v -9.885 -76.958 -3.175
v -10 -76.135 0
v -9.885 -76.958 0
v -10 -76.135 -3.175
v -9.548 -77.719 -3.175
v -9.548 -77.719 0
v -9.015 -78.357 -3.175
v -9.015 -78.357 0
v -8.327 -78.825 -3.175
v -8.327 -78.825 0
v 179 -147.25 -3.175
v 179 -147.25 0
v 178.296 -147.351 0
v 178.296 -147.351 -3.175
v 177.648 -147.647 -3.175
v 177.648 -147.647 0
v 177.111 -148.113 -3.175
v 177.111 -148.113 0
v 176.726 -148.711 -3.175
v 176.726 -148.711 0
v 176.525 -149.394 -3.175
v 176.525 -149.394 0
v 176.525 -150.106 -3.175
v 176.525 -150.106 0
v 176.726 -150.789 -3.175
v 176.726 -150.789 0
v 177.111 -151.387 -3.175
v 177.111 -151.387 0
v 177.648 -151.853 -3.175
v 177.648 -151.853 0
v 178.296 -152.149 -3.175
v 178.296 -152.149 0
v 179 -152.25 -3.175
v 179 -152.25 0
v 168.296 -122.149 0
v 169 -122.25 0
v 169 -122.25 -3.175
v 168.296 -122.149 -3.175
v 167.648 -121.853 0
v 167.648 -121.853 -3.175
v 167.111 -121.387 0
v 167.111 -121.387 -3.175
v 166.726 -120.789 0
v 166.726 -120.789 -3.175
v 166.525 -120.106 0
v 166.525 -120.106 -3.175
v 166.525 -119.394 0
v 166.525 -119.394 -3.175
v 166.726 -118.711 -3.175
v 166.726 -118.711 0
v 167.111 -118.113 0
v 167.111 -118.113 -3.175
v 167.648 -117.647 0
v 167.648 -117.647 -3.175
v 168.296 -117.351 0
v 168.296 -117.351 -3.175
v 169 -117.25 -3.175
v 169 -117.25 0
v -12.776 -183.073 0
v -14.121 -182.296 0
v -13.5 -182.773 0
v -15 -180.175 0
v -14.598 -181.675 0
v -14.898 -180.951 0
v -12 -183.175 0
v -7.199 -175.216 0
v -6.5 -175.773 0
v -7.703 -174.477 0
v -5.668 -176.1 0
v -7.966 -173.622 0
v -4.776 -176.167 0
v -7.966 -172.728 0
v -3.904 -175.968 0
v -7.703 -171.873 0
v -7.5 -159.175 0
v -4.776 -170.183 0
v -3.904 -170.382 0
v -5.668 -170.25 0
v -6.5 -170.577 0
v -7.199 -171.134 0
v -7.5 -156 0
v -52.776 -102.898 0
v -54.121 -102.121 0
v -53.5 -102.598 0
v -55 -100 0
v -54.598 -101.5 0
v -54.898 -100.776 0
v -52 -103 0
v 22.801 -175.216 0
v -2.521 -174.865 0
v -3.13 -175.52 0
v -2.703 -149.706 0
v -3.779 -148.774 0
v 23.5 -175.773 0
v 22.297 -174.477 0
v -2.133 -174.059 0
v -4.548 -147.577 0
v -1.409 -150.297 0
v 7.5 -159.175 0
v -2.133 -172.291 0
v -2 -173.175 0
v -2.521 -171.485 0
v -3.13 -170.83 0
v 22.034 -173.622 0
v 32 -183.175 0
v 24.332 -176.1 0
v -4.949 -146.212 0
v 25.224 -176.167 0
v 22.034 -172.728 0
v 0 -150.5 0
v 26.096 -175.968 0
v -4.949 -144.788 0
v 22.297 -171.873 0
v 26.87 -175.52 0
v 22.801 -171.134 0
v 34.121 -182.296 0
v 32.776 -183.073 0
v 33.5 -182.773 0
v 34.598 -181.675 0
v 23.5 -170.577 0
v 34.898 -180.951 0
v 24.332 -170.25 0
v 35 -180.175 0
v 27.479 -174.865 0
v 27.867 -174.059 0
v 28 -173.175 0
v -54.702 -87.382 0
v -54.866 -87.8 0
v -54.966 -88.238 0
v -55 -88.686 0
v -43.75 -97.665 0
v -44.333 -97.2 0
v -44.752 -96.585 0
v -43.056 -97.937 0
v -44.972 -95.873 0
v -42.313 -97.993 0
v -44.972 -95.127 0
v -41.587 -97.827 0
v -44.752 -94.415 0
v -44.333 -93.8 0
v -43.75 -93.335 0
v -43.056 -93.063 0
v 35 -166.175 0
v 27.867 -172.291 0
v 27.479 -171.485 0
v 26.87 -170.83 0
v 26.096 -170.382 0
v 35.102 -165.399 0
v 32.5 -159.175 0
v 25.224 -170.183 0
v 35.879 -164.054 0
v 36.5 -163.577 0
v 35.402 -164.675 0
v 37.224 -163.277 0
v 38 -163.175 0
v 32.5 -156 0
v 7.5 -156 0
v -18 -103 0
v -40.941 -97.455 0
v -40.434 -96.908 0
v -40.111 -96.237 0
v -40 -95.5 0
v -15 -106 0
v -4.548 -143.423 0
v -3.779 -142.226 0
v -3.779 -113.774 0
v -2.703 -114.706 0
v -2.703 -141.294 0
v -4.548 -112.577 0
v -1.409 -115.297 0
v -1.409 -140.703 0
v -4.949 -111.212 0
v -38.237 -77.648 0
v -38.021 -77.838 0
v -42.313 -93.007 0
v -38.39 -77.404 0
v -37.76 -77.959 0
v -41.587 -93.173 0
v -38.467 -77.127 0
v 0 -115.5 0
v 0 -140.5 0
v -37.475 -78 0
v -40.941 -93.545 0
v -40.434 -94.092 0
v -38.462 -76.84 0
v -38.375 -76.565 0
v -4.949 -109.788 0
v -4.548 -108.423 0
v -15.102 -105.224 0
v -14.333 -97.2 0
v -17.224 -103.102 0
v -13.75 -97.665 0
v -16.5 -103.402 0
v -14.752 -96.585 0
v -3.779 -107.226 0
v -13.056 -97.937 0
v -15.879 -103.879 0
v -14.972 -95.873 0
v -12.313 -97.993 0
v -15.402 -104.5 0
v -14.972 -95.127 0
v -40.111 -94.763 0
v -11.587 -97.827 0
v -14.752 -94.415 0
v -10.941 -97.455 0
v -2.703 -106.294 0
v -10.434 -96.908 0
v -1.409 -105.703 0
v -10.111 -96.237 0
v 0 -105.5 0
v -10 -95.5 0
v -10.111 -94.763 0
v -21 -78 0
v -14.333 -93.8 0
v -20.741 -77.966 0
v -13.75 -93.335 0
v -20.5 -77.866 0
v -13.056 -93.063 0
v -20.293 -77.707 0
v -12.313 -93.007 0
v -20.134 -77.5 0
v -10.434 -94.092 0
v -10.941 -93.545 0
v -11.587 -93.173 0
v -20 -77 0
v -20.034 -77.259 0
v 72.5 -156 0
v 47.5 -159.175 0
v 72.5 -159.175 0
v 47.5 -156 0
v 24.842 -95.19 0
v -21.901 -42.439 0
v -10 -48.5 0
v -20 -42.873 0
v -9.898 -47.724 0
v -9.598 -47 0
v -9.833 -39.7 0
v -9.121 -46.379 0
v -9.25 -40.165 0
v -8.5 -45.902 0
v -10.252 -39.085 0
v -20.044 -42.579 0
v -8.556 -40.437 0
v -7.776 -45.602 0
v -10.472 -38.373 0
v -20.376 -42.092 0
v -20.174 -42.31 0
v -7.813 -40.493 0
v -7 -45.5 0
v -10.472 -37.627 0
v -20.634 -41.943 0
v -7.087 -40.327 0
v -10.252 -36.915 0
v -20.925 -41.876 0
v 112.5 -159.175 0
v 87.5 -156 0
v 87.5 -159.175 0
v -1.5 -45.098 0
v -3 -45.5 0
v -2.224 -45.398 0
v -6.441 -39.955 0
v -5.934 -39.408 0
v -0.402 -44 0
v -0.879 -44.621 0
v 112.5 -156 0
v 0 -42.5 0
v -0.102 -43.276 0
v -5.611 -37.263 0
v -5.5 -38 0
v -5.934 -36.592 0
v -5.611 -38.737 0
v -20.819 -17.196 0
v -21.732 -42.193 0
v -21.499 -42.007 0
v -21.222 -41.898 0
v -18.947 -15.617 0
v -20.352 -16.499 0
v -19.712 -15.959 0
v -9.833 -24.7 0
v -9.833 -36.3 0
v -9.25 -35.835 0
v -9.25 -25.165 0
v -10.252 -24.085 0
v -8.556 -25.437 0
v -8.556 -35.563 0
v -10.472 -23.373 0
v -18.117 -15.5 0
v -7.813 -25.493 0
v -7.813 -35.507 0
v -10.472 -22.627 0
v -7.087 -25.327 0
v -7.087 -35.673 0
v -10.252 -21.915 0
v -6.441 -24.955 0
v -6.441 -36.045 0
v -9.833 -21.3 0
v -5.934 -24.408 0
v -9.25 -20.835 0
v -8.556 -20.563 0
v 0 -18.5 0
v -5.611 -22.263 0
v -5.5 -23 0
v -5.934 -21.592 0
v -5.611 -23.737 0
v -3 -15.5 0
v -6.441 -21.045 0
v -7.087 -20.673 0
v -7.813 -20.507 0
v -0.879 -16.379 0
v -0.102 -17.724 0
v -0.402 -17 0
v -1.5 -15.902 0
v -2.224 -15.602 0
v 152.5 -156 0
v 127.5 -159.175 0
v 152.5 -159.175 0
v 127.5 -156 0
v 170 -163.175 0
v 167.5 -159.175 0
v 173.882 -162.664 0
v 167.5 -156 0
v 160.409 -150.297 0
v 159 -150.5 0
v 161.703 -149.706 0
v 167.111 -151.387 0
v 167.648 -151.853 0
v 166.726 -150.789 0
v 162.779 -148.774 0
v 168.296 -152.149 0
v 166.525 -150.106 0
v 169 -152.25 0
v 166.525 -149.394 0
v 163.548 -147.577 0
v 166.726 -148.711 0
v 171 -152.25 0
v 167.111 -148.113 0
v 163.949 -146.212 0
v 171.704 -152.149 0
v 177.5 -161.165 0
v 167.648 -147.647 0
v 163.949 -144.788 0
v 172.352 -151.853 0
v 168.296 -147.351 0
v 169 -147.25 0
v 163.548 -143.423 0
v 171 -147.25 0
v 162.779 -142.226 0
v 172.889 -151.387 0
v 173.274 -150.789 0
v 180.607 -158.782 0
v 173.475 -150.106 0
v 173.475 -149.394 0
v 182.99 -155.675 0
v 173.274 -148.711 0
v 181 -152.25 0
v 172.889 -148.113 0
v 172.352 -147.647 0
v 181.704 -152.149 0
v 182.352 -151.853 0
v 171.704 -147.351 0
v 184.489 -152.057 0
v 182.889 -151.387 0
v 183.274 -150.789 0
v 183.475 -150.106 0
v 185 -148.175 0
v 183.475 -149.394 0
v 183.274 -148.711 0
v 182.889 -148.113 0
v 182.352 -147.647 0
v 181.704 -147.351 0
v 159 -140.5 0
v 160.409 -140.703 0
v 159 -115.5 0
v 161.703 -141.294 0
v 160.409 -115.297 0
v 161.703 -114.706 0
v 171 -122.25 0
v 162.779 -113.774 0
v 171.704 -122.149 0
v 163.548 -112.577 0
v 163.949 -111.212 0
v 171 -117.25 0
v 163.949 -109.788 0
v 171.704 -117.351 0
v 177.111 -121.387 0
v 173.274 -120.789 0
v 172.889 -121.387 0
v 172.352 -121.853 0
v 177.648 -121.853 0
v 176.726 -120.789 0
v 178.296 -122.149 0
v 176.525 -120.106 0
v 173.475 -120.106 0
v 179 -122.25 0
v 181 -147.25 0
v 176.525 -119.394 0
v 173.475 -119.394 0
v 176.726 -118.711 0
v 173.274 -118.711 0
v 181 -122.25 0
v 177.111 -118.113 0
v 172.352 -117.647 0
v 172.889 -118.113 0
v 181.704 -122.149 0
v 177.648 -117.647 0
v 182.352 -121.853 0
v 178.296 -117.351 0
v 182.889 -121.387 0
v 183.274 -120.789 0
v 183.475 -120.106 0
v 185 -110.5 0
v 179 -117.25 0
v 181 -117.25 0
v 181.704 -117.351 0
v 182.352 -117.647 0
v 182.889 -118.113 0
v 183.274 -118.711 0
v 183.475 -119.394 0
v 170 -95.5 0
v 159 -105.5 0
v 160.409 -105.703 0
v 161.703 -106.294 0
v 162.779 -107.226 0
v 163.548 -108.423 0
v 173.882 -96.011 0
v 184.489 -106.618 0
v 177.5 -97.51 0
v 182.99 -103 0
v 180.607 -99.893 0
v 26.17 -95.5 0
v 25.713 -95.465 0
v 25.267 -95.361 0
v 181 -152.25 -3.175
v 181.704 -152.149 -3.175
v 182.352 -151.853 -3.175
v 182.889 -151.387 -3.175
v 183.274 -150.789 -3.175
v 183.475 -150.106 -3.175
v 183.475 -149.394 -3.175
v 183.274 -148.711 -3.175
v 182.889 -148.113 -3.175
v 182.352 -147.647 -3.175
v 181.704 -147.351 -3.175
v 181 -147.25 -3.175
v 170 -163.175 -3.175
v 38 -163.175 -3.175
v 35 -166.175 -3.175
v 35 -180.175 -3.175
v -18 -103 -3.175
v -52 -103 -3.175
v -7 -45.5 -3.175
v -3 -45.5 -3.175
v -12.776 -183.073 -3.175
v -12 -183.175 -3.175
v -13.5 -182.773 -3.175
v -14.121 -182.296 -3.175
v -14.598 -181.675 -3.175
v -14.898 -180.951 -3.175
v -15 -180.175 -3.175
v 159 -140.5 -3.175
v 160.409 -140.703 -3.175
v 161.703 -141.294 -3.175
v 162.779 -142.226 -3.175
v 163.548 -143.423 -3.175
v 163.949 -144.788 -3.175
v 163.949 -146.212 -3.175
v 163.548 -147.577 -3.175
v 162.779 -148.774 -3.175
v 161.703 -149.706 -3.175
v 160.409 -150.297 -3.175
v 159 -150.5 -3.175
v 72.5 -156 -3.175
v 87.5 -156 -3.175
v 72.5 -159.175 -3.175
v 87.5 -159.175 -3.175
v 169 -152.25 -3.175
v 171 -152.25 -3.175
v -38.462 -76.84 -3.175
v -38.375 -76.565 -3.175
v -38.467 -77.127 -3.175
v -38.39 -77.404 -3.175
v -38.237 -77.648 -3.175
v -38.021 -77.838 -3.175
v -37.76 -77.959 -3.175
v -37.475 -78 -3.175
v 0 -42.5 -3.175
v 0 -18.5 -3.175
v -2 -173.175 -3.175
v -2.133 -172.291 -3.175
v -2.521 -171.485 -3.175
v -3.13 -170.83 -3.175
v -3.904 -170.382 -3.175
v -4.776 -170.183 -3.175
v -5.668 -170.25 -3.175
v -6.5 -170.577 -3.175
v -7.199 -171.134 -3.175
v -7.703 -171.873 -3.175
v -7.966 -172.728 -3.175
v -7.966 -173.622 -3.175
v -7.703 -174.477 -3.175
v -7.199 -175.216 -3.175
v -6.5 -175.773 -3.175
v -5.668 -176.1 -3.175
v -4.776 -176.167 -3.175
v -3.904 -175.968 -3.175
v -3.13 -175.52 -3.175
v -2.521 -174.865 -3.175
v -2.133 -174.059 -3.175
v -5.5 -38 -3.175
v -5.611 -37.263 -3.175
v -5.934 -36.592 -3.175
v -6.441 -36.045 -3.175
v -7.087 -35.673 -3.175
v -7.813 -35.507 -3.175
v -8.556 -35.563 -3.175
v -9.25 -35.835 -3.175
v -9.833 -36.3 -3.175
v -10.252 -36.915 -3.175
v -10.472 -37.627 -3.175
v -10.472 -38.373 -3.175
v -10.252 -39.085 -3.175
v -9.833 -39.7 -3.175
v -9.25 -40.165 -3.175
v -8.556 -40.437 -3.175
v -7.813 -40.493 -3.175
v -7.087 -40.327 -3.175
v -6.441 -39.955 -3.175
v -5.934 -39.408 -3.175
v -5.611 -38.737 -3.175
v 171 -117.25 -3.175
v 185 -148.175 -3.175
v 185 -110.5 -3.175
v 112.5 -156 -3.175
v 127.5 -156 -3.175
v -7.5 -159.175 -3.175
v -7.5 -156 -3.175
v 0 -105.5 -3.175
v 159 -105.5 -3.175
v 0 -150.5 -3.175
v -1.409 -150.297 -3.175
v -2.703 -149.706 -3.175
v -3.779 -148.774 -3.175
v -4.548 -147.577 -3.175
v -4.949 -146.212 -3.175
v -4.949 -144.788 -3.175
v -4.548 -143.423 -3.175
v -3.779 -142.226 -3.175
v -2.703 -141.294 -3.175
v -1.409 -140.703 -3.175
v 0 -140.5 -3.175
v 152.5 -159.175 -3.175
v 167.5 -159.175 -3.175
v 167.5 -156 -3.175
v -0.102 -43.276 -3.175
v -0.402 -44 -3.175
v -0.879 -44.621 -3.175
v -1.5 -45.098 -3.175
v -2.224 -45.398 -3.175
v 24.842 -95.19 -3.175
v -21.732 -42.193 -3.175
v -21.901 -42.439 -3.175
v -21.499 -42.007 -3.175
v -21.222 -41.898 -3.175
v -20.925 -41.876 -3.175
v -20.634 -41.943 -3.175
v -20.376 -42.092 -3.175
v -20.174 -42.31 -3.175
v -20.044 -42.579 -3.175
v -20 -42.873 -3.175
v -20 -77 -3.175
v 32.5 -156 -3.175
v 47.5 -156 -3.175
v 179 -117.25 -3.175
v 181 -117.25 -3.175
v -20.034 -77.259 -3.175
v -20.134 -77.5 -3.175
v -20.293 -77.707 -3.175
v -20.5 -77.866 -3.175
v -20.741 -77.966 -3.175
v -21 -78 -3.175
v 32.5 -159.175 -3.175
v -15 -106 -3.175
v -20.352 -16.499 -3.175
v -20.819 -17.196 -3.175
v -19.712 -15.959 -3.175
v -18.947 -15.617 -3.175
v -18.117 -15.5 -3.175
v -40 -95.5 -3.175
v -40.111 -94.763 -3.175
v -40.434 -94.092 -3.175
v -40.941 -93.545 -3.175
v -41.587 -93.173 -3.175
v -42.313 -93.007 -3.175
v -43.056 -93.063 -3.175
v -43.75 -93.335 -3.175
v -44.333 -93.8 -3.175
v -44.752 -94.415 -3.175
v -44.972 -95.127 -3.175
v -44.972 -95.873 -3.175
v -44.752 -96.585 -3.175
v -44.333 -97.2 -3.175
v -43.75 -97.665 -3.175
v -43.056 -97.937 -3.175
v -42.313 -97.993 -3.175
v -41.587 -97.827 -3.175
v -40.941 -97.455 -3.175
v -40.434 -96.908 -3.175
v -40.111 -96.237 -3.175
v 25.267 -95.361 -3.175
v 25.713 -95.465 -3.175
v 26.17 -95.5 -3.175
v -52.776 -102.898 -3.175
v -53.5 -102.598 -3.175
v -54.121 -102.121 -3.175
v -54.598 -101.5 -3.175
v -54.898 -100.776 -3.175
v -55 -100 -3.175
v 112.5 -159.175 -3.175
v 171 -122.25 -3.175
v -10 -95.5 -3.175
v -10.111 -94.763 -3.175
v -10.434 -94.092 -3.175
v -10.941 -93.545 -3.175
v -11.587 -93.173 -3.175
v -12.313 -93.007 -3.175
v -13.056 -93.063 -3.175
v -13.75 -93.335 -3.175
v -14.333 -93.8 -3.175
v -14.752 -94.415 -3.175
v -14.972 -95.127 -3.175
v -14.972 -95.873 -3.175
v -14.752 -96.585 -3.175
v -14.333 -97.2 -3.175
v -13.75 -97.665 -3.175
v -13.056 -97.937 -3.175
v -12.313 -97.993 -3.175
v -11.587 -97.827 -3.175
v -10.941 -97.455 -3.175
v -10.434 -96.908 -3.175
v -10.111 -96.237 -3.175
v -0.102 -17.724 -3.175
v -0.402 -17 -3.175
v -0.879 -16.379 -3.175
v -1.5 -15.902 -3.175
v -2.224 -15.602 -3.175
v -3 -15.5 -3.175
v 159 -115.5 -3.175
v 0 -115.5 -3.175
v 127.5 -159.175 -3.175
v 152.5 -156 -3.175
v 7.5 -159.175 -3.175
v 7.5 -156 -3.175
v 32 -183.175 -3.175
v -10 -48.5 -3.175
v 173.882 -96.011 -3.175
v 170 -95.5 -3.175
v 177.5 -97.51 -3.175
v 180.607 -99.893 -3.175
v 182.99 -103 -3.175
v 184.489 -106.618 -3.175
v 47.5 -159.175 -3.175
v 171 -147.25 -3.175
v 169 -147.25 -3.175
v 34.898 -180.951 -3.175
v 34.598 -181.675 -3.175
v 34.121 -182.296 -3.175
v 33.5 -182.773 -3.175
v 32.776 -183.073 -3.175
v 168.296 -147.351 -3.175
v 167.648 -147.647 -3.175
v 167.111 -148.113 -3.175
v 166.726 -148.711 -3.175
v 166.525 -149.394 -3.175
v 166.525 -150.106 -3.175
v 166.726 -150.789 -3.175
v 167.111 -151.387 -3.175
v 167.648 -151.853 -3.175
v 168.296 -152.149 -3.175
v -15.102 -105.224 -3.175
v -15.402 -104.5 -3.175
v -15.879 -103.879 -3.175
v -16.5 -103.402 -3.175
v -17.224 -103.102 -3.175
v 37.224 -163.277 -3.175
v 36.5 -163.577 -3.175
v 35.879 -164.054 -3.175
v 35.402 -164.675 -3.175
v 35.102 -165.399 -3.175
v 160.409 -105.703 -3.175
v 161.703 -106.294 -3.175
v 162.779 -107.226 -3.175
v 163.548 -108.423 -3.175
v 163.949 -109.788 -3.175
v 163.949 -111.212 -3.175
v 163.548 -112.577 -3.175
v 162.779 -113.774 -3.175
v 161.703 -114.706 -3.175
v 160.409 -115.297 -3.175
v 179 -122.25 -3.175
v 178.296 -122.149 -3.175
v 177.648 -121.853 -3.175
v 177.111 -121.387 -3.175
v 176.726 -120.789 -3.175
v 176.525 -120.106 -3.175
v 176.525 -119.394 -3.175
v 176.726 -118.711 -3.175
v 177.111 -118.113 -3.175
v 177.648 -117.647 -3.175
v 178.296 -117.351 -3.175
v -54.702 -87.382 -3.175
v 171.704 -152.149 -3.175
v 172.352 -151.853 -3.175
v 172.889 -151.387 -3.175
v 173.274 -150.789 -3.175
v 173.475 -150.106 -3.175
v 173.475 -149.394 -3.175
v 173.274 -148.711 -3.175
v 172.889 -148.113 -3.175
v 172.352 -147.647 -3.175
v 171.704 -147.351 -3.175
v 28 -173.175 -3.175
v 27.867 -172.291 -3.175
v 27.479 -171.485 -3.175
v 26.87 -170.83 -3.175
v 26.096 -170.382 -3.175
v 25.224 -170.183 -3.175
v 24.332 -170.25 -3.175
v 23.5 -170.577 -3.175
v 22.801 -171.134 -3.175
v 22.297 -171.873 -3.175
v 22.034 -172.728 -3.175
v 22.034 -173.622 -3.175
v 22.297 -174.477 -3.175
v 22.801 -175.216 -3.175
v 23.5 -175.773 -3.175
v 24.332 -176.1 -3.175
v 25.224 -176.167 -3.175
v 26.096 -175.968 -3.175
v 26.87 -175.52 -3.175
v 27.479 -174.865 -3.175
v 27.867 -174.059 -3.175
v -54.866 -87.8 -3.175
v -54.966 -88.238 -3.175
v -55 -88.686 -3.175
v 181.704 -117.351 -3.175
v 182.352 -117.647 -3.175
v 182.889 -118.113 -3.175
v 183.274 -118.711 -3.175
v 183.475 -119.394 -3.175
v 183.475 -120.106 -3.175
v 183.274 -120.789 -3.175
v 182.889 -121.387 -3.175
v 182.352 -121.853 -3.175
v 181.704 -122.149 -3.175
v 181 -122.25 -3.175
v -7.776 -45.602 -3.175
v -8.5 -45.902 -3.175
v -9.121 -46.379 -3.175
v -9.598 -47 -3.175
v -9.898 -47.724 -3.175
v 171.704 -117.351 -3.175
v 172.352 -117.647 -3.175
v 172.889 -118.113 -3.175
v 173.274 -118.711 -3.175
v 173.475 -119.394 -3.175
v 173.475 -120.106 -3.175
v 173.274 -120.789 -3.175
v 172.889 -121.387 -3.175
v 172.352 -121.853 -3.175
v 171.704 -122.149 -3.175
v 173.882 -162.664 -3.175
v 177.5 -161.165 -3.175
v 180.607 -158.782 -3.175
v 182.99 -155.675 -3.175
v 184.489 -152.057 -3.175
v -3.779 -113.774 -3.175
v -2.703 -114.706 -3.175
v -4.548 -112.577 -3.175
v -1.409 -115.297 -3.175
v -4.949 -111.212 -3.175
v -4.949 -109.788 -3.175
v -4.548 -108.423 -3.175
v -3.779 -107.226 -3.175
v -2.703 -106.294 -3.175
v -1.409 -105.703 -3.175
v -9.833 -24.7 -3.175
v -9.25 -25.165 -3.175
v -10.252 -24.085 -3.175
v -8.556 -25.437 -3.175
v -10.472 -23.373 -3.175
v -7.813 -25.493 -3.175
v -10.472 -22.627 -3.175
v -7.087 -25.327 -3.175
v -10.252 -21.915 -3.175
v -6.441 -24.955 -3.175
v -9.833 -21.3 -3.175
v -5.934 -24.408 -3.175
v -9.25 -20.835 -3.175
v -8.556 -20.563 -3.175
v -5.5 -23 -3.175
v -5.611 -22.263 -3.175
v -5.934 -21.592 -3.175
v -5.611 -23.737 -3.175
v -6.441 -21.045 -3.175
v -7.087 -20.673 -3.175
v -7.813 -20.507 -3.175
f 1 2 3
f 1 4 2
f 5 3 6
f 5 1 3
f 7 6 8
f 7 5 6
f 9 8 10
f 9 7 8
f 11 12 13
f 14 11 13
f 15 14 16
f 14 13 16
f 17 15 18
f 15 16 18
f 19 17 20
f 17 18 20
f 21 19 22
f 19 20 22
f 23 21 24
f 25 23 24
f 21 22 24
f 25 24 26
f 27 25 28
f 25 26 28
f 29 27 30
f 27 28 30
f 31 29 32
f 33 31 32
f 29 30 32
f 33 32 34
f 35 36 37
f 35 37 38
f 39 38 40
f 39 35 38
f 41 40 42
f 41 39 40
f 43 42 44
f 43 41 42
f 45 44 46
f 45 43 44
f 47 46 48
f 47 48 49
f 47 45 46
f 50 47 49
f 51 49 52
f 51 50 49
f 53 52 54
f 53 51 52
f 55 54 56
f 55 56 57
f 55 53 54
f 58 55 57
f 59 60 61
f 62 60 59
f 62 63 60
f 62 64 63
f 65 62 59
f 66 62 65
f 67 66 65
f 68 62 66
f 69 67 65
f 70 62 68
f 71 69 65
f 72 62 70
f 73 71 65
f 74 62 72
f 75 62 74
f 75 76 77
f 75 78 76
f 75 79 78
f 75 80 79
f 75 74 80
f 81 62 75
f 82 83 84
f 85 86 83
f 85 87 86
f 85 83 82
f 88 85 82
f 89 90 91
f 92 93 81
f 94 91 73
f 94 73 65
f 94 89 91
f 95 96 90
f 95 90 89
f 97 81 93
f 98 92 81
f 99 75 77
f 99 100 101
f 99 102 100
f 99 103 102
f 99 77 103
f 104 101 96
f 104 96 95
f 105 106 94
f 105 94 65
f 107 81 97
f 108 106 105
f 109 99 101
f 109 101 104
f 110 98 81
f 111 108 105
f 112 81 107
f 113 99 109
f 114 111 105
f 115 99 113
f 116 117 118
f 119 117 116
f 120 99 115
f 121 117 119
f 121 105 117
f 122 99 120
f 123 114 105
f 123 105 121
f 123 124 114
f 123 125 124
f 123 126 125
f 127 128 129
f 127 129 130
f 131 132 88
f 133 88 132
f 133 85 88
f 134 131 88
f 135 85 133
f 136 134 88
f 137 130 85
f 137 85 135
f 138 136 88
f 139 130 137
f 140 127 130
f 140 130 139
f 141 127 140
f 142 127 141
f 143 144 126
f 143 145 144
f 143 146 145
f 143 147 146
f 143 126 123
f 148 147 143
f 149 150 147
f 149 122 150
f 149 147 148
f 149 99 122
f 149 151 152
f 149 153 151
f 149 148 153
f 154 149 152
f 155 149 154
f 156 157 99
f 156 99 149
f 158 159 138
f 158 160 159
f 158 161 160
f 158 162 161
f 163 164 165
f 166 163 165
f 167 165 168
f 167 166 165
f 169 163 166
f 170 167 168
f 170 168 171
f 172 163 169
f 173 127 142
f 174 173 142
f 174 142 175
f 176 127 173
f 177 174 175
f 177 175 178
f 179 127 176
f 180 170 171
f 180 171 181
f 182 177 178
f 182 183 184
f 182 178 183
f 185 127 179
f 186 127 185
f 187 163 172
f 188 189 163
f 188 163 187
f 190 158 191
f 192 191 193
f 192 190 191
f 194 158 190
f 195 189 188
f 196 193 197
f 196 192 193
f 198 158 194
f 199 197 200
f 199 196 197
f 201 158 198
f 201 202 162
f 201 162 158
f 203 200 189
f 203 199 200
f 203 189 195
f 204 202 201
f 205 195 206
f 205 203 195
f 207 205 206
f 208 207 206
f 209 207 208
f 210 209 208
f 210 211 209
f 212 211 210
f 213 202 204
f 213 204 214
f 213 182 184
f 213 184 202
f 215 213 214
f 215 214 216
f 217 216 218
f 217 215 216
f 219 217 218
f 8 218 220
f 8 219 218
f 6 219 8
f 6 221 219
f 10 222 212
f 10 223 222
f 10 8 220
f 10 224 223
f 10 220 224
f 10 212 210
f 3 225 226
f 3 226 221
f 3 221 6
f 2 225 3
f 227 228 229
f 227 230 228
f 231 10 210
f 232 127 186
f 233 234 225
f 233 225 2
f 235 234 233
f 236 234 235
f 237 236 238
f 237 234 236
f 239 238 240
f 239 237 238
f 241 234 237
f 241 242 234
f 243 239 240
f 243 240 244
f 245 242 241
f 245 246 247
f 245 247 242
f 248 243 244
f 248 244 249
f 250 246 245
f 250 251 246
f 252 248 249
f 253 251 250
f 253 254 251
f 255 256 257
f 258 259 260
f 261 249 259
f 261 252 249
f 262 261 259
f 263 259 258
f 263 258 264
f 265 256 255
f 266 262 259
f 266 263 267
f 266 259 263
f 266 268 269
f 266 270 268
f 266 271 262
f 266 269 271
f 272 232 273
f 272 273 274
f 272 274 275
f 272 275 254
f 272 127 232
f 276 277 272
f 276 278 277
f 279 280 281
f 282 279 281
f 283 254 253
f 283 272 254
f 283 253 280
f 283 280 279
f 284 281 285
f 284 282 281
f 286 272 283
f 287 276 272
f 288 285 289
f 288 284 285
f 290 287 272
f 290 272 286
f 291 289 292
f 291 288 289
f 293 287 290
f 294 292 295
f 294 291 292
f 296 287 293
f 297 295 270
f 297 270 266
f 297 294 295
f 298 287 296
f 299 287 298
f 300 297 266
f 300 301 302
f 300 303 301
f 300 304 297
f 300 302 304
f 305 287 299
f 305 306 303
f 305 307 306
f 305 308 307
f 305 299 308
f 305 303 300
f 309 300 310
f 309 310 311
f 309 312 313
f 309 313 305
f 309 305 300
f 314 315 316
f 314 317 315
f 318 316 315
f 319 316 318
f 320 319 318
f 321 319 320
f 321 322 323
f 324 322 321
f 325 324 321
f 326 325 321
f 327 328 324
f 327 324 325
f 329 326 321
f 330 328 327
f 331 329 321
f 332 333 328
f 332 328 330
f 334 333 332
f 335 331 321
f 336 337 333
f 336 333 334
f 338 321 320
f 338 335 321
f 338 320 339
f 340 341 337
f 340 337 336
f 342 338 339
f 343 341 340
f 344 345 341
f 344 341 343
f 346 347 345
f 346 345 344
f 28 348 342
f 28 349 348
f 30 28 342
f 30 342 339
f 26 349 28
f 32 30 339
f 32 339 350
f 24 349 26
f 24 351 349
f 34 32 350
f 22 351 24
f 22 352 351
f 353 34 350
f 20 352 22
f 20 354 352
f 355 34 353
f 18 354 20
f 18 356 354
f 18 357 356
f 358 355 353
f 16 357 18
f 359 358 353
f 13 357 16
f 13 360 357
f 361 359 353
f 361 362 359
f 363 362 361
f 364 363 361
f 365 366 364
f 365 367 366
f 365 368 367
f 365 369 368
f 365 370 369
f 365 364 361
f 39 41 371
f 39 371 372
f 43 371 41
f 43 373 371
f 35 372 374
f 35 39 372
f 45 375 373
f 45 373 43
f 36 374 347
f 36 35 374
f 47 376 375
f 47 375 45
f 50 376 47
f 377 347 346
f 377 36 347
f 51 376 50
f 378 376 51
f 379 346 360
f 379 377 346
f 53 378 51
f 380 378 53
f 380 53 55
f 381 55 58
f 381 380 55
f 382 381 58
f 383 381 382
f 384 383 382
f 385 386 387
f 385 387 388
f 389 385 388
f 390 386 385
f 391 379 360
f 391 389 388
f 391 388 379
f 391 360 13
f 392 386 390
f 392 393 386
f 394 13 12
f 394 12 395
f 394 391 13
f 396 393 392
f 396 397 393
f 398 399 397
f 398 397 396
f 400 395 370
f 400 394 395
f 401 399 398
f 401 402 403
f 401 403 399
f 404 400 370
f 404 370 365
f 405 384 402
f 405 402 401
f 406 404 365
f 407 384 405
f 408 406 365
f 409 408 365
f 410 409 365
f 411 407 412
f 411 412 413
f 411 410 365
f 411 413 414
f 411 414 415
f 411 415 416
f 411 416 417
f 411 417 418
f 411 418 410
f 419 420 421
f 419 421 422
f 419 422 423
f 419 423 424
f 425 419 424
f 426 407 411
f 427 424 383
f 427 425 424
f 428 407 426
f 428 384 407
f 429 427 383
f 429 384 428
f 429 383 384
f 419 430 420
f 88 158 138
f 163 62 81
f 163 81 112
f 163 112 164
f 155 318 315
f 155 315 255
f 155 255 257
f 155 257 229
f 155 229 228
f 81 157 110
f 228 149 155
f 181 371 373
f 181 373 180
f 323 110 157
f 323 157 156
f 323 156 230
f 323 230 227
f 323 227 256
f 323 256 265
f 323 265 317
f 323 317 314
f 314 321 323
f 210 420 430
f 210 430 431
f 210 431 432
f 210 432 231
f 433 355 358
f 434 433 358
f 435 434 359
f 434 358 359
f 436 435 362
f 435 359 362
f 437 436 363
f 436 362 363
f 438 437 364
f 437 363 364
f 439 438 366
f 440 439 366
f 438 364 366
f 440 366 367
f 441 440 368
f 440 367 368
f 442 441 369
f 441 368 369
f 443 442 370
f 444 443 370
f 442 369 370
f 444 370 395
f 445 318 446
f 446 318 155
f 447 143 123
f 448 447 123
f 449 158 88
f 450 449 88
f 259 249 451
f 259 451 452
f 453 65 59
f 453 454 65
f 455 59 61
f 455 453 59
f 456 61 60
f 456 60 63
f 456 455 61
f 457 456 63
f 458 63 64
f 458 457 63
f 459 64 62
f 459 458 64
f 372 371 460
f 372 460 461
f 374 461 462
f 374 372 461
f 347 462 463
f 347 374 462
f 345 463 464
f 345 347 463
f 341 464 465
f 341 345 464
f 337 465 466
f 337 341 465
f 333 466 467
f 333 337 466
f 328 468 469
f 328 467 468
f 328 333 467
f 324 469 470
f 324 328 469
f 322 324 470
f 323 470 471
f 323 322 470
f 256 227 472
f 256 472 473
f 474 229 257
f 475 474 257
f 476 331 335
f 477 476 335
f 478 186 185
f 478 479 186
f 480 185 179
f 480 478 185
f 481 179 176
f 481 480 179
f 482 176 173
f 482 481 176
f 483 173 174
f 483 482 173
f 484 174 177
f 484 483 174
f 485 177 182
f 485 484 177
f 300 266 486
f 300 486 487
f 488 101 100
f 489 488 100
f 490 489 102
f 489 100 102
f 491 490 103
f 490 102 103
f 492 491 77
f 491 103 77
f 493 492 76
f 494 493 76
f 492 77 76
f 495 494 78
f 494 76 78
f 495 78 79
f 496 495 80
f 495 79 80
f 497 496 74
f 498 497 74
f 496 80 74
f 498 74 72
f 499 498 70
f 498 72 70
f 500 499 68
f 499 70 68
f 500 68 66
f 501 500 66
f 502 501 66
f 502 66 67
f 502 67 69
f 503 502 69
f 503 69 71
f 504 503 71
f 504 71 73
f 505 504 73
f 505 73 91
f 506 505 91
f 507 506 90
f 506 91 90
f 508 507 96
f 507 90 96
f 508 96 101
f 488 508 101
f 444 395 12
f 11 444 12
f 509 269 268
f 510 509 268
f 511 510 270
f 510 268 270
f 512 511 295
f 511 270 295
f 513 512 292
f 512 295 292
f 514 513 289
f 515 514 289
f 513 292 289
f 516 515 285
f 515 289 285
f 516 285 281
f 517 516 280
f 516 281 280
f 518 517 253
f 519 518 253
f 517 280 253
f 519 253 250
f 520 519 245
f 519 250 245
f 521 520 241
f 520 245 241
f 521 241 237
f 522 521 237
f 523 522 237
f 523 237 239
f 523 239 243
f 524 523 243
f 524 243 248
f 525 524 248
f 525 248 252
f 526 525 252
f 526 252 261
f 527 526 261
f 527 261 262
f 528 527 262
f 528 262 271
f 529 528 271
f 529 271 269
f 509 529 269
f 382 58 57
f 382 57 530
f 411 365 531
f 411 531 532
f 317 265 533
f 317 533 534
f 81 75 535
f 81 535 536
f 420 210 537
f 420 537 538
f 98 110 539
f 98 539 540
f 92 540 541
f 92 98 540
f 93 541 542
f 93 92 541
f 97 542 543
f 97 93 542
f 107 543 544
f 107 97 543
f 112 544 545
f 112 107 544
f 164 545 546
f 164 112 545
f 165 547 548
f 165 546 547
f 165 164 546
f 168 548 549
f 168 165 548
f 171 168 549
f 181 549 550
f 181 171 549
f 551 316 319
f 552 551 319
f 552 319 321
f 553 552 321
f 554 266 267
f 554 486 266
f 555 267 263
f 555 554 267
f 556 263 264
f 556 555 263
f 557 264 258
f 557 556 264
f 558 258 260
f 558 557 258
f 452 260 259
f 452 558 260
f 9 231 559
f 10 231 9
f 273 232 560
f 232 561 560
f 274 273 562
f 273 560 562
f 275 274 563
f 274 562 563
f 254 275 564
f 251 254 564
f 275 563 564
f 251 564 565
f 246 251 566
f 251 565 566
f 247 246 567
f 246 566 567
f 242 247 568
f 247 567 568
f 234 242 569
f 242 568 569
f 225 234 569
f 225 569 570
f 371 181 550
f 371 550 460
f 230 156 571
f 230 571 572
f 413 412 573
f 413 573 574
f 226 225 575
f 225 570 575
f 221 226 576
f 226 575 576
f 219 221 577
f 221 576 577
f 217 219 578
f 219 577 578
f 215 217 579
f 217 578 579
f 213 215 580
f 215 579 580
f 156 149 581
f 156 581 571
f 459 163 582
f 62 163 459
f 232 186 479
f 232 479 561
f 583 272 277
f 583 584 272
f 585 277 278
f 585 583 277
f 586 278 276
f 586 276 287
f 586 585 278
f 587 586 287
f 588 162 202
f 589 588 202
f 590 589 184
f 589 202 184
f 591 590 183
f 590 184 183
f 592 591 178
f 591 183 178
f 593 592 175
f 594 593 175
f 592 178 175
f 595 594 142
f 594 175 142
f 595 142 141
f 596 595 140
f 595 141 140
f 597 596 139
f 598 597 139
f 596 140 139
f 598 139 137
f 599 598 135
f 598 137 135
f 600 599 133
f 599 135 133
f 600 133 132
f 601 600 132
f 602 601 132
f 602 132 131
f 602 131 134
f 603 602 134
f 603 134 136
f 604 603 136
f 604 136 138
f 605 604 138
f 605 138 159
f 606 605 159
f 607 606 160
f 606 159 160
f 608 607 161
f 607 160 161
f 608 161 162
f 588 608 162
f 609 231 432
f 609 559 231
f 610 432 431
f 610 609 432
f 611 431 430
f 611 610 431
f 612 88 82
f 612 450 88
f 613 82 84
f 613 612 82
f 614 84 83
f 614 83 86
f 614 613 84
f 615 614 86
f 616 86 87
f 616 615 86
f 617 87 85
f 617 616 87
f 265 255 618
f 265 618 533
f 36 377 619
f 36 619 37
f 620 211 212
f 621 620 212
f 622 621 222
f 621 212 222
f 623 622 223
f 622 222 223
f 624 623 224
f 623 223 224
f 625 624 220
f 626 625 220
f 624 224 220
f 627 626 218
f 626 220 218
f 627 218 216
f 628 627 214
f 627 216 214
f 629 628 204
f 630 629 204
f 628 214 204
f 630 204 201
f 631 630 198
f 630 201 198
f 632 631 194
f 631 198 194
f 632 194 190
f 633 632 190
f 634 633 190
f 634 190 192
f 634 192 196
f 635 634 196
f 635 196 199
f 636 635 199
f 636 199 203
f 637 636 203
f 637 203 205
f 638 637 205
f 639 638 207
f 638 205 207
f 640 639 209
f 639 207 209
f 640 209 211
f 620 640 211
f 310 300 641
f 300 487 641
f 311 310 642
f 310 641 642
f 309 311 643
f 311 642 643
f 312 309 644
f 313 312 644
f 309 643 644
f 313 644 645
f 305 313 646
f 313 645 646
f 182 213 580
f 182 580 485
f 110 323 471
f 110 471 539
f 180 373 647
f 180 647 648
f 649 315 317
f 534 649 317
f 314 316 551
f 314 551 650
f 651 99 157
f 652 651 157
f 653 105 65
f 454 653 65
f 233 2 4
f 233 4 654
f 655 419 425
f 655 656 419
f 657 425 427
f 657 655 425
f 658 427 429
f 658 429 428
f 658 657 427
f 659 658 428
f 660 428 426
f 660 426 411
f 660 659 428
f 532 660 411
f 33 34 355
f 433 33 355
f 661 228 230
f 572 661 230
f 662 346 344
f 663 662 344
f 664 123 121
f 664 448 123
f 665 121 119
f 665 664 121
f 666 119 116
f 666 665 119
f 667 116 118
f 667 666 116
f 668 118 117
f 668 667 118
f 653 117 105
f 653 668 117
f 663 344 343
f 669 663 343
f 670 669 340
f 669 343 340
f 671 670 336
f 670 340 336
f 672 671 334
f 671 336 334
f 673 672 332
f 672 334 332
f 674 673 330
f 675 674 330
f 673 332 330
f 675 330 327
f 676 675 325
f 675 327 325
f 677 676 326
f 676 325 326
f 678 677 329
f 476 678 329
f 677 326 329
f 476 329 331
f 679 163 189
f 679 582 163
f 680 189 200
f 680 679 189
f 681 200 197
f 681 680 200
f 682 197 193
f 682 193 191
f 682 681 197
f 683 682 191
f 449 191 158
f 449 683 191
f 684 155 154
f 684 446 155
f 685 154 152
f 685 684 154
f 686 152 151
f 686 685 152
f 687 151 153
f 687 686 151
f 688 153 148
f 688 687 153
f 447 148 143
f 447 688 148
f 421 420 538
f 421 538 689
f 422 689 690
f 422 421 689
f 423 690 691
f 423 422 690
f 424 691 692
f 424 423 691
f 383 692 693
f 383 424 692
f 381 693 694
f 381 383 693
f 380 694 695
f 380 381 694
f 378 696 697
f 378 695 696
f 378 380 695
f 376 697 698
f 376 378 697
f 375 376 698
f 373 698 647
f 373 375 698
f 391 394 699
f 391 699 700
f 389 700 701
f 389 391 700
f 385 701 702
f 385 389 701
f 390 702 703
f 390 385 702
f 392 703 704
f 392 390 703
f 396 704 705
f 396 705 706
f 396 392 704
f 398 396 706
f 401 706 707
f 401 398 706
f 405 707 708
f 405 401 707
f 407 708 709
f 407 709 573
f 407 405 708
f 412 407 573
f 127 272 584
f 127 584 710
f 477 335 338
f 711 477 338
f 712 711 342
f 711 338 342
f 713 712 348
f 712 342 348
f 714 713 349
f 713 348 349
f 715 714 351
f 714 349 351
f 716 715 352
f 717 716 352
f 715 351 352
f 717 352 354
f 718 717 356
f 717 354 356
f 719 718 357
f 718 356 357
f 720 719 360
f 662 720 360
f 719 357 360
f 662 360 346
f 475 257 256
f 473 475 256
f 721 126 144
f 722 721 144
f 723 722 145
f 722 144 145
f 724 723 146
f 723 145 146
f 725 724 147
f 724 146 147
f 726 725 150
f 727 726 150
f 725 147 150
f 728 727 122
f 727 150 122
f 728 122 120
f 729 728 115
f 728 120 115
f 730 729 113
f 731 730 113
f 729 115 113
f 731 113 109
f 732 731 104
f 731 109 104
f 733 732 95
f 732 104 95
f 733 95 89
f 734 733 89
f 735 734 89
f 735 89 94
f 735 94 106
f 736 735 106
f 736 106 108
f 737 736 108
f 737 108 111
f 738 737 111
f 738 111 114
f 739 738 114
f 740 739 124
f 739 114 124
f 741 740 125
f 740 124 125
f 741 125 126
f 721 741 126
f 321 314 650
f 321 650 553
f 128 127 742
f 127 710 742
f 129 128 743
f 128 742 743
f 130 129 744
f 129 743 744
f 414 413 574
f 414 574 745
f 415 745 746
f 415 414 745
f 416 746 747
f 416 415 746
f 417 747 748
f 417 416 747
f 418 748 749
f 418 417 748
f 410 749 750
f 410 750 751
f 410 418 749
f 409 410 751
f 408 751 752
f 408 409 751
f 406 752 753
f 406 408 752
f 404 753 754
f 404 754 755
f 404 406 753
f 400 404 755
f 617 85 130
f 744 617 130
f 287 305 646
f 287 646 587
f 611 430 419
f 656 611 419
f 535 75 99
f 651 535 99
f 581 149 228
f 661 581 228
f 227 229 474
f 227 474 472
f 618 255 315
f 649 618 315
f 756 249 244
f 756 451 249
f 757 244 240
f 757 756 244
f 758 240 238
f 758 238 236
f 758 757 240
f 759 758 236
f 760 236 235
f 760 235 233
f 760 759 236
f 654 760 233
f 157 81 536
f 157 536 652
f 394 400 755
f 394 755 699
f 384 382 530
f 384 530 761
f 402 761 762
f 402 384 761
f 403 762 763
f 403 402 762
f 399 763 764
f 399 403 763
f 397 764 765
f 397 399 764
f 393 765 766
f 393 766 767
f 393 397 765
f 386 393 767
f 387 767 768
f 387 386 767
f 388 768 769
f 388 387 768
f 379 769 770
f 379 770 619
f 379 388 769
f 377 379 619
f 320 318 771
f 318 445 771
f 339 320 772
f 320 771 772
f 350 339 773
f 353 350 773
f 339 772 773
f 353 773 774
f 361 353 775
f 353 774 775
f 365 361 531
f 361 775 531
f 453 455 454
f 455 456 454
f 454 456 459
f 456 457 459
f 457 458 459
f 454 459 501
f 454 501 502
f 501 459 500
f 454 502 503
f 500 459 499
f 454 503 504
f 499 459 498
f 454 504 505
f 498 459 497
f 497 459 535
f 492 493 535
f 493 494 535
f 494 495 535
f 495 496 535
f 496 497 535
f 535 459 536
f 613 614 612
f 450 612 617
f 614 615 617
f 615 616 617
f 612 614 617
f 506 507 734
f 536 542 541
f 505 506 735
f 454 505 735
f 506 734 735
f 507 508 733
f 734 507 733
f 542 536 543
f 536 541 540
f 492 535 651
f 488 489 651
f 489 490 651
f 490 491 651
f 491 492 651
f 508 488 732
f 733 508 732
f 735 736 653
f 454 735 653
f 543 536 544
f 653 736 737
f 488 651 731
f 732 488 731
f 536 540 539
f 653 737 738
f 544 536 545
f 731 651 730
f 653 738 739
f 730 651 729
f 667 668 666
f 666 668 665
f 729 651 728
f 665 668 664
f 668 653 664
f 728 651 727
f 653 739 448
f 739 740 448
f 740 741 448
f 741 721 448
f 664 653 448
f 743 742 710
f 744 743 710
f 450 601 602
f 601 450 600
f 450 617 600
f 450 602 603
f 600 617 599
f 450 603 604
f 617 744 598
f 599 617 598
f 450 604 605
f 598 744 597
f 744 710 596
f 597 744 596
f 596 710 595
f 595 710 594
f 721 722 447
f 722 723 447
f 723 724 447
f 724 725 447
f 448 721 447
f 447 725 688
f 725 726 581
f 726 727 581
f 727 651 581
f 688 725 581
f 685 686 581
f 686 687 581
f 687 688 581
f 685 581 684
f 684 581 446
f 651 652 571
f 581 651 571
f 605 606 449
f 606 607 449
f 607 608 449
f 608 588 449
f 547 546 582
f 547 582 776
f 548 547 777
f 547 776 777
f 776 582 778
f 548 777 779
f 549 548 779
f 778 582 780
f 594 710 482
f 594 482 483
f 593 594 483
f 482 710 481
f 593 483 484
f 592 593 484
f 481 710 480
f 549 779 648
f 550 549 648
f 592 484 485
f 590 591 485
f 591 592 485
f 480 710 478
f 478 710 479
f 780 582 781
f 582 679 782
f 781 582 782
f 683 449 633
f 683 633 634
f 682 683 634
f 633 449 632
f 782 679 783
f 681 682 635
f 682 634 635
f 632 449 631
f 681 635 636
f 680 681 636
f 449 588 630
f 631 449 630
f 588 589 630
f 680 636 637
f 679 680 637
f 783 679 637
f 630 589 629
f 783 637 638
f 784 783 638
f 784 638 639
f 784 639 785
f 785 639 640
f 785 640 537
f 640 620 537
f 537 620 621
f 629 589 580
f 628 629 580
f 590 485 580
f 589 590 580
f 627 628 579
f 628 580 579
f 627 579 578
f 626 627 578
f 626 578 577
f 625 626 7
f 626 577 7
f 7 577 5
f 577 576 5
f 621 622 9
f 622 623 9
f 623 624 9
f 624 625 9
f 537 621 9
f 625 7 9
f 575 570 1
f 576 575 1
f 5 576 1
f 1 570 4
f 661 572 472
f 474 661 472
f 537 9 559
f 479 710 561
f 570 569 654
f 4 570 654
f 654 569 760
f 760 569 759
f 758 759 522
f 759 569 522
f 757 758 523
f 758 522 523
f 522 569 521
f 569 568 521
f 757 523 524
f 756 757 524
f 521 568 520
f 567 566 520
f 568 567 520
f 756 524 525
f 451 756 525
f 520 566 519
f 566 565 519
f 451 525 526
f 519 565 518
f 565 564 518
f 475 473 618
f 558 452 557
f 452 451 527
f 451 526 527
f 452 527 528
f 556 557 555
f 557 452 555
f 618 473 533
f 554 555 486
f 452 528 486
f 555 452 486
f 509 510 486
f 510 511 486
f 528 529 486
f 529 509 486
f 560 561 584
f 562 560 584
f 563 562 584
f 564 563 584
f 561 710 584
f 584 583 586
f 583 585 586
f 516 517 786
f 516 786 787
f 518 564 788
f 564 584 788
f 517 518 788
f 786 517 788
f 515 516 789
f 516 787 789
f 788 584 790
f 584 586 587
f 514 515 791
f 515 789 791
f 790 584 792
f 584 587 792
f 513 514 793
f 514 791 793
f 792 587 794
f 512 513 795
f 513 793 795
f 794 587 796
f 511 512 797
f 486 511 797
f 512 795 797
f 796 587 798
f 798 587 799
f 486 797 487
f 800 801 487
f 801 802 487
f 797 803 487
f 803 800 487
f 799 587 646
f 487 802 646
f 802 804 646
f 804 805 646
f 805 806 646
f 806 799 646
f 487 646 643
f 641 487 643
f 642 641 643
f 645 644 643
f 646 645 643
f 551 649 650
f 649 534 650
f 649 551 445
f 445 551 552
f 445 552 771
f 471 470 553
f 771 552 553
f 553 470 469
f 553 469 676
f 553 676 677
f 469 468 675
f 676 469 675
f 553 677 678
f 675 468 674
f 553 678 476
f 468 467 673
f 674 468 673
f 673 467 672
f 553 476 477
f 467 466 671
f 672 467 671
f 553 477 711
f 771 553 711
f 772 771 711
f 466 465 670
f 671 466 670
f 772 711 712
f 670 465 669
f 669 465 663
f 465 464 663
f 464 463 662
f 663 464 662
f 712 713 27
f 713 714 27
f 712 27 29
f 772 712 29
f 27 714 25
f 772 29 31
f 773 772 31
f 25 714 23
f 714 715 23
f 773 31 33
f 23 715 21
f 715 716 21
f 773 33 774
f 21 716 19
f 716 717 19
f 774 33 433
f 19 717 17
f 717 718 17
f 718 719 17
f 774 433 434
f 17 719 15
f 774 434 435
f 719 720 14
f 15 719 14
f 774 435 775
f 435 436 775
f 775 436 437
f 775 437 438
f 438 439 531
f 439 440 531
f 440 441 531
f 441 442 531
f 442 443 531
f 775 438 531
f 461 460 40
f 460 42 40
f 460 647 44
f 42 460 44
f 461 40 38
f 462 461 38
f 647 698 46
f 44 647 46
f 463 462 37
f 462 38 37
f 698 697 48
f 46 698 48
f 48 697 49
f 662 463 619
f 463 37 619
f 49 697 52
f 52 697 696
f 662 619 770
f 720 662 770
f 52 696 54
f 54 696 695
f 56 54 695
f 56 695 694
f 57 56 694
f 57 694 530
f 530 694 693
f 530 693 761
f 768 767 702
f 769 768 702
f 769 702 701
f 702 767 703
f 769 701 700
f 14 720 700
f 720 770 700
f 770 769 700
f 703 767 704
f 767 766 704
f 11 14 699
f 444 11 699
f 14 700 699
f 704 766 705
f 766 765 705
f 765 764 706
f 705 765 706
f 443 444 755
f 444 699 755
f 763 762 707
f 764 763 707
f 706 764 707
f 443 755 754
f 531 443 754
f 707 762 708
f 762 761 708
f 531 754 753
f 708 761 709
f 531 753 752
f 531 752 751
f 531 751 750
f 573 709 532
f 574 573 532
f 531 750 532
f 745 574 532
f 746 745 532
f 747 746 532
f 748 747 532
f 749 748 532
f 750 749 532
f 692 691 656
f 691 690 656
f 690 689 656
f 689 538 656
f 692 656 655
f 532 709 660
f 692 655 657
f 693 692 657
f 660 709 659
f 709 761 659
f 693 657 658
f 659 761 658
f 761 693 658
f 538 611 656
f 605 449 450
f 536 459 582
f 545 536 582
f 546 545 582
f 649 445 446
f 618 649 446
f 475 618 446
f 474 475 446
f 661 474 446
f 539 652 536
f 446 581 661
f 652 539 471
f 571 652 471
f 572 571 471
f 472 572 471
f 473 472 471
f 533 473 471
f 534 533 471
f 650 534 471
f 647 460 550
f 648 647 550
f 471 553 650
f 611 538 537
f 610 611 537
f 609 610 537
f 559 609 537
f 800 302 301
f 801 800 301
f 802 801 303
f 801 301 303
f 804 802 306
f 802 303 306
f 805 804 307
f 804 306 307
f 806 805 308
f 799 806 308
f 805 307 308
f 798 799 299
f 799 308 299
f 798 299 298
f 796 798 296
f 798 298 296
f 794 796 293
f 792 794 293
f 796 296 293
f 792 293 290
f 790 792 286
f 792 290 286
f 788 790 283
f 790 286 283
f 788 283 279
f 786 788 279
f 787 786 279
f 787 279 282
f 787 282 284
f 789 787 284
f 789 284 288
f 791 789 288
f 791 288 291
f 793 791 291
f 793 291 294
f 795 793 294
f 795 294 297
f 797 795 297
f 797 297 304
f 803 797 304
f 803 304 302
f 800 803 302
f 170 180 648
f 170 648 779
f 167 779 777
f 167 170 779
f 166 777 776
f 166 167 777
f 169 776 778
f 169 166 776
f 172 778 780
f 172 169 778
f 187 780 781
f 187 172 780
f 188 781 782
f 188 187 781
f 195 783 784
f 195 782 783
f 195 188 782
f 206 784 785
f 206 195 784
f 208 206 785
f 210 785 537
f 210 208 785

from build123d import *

# Parameters (mm, degrees)
SKETCH1_R           = 3
SKETCH1_R_2         = 2.5
SKETCH1_W           = 15
SKETCH1_H           = 3.175
BASE_FLANGE1_DEPTH  = 3.175
CUT_EXTRUDE1_DEPTH  = 10
SKETCH3_W           = 10
SKETCH3_H           = 30
BOSS_EXTRUDE1_DEPTH = 3.175
FILLET2_R           = 3
FILLET1_R           = 15
FILLET3_R           = 1
SKETCH4_R           = 2.5
CUT_EXTRUDE2_DEPTH  = 10
SKETCH5_W           = 6.305242908
SKETCH5_H           = 6.547752252
BOSS_EXTRUDE2_DEPTH = 3.175


# Sheet-metal steps are written as plain solids
with BuildPart() as part:
    # Sketch1 → Base-Flange1 (new body)
    with BuildSketch(Plane.XY):
        Polygon((-4.193265857, -88), (25.47, -95.5), (185, -95.5), (185, -143.5), (185, -148.5), (185, -163.175), (35, -163.175), (35, -183.175), (-15, -183.175), (-15, -163.175), (-15, -150.03), (-15, -103), (-55, -103), (-55, -88), align=None)
        with Locations((-5, -173.175)):
            Circle(SKETCH1_R, mode=Mode.SUBTRACT)
        with Locations((25, -173.175)):
            Circle(SKETCH1_R, mode=Mode.SUBTRACT)
        with Locations((-42.5, -95.5)):
            Circle(SKETCH1_R_2, mode=Mode.SUBTRACT)
        with Locations((-12.5, -95.5)):
            Circle(SKETCH1_R_2, mode=Mode.SUBTRACT)
        with Locations((160, -157.5875)):
            Rectangle(SKETCH1_W, SKETCH1_H, mode=Mode.SUBTRACT)
        with Locations((40, -157.5875)):
            Rectangle(SKETCH1_W, SKETCH1_H, mode=Mode.SUBTRACT)
        with Locations((0, -157.5875)):
            Rectangle(SKETCH1_W, SKETCH1_H, mode=Mode.SUBTRACT)
        with Locations((80, -157.5875)):
            Rectangle(SKETCH1_W, SKETCH1_H, mode=Mode.SUBTRACT)
        with Locations((120, -157.5875)):
            Rectangle(SKETCH1_W, SKETCH1_H, mode=Mode.SUBTRACT)
        with BuildLine():
            Line((181, -122.25), (179, -122.25))
            ThreePointArc((179, -122.25), (176.5, -119.75), (179, -117.25))
            Line((179, -117.25), (181, -117.25))
            ThreePointArc((181, -117.25), (183.5, -119.75), (181, -122.25))
        make_face(mode=Mode.SUBTRACT)
        with BuildLine():
            Line((171, -122.25), (169, -122.25))
            ThreePointArc((169, -122.25), (166.5, -119.75), (169, -117.25))
            Line((169, -117.25), (171, -117.25))
            ThreePointArc((171, -117.25), (173.5, -119.75), (171, -122.25))
        make_face(mode=Mode.SUBTRACT)
        with BuildLine():
            Line((171, -147.25), (169, -147.25))
            ThreePointArc((169, -147.25), (166.5, -149.75), (169, -152.25))
            Line((169, -152.25), (171, -152.25))
            ThreePointArc((171, -152.25), (173.5, -149.75), (171, -147.25))
        make_face(mode=Mode.SUBTRACT)
        with BuildLine():
            Line((181, -147.25), (179, -147.25))
            ThreePointArc((179, -147.25), (176.5, -149.75), (179, -152.25))
            Line((179, -152.25), (181, -152.25))
            ThreePointArc((181, -152.25), (183.5, -149.75), (181, -147.25))
        make_face(mode=Mode.SUBTRACT)
    extrude(amount=-BASE_FLANGE1_DEPTH)

    # Sketch2 → Cut-Extrude1 (cut)
    with BuildSketch(Plane.XY):
        with BuildLine():
            Line((0, -105.5), (159, -105.5))
            ThreePointArc((159, -105.5), (164, -110.5), (159, -115.5))
            Line((159, -115.5), (0, -115.5))
            ThreePointArc((0, -115.5), (-5, -110.5), (0, -105.5))
        make_face()
        with BuildLine():
            Line((0, -140.5), (159, -140.5))
            ThreePointArc((159, -140.5), (164, -145.5), (159, -150.5))
            Line((159, -150.5), (0, -150.5))
            ThreePointArc((0, -150.5), (-5, -145.5), (0, -140.5))
        make_face()
    extrude(amount=-CUT_EXTRUDE1_DEPTH, mode=Mode.SUBTRACT)

    # Sketch3 → Boss-Extrude1 (add)
    # profile 1 of 3: a face of its own
    with BuildSketch(Plane.XY):
        Polygon((-20, -15.5), (-55, -88), (-10, -88), (-10, -78), (-10, -45.5), (-10, -15.5), align=None)
        Polygon((-20, -38.501774554), (-20, -78), (-39.068108836, -78), align=None, mode=Mode.SUBTRACT)
    # profile 2 of 3: a face of its own
    with BuildSketch(Plane.XY):
        Polygon((-10, -78), (-10, -88), (25.47, -95.5), align=None)
    # profile 3 of 3: a face of its own
    with BuildSketch(Plane.XY):
        with Locations((-5, -30.5)):
            Rectangle(SKETCH3_W, SKETCH3_H)
    extrude(amount=-BOSS_EXTRUDE1_DEPTH)

    # Fillet2
    fillet2_edges = [part.edges().sort_by_distance(p)[0] for p in [
        (25.47, -95.5, -1.5875),
        (35, -163.175, -1.5875),
        (35, -183.175, -1.5875),
        (-15, -183.175, -1.5875),
        (-15, -103, -1.5875),
        (-55, -103, -1.5875),
        (-55, -88, -1.5875),
        (0, -45.5, -1.5875),
        (0, -15.5, -1.5875),
        (-20, -15.5, -1.5875),
        (-10, -78, -1.5875),
        (-10, -45.5, -1.5875),
    ]]
    fillet(fillet2_edges, radius=FILLET2_R)

    # Fillet1
    fillet1_edges = [part.edges().sort_by_distance(p)[0] for p in [
        (185, -95.5, -1.5875),
        (185, -163.175, -1.5875),
    ]]
    fillet(fillet1_edges, radius=FILLET1_R)

    # Fillet3
    fillet3_edges = [part.edges().sort_by_distance(p)[0] for p in [
        (-20, -78, -1.5875),
        (-39.068108836, -78, -1.5875),
        (-20, -38.501774554, -1.5875),
    ]]
    fillet(fillet3_edges, radius=FILLET3_R)

    # Sketch4 → Cut-Extrude2 (cut)
    with BuildSketch(Plane.XY):
        with Locations((-8, -23)):
            Circle(SKETCH4_R)
        with Locations((-8, -38)):
            Circle(SKETCH4_R)
    extrude(amount=-CUT_EXTRUDE2_DEPTH, mode=Mode.SUBTRACT)

    # Sketch5 → Boss-Extrude2 (add)
    with BuildSketch(Plane.XY):
        with Locations((-8.695694073, -86.656931436)):
            Rectangle(SKETCH5_W, SKETCH5_H)
    extrude(amount=-BOSS_EXTRUDE2_DEPTH)


solid = part.part
